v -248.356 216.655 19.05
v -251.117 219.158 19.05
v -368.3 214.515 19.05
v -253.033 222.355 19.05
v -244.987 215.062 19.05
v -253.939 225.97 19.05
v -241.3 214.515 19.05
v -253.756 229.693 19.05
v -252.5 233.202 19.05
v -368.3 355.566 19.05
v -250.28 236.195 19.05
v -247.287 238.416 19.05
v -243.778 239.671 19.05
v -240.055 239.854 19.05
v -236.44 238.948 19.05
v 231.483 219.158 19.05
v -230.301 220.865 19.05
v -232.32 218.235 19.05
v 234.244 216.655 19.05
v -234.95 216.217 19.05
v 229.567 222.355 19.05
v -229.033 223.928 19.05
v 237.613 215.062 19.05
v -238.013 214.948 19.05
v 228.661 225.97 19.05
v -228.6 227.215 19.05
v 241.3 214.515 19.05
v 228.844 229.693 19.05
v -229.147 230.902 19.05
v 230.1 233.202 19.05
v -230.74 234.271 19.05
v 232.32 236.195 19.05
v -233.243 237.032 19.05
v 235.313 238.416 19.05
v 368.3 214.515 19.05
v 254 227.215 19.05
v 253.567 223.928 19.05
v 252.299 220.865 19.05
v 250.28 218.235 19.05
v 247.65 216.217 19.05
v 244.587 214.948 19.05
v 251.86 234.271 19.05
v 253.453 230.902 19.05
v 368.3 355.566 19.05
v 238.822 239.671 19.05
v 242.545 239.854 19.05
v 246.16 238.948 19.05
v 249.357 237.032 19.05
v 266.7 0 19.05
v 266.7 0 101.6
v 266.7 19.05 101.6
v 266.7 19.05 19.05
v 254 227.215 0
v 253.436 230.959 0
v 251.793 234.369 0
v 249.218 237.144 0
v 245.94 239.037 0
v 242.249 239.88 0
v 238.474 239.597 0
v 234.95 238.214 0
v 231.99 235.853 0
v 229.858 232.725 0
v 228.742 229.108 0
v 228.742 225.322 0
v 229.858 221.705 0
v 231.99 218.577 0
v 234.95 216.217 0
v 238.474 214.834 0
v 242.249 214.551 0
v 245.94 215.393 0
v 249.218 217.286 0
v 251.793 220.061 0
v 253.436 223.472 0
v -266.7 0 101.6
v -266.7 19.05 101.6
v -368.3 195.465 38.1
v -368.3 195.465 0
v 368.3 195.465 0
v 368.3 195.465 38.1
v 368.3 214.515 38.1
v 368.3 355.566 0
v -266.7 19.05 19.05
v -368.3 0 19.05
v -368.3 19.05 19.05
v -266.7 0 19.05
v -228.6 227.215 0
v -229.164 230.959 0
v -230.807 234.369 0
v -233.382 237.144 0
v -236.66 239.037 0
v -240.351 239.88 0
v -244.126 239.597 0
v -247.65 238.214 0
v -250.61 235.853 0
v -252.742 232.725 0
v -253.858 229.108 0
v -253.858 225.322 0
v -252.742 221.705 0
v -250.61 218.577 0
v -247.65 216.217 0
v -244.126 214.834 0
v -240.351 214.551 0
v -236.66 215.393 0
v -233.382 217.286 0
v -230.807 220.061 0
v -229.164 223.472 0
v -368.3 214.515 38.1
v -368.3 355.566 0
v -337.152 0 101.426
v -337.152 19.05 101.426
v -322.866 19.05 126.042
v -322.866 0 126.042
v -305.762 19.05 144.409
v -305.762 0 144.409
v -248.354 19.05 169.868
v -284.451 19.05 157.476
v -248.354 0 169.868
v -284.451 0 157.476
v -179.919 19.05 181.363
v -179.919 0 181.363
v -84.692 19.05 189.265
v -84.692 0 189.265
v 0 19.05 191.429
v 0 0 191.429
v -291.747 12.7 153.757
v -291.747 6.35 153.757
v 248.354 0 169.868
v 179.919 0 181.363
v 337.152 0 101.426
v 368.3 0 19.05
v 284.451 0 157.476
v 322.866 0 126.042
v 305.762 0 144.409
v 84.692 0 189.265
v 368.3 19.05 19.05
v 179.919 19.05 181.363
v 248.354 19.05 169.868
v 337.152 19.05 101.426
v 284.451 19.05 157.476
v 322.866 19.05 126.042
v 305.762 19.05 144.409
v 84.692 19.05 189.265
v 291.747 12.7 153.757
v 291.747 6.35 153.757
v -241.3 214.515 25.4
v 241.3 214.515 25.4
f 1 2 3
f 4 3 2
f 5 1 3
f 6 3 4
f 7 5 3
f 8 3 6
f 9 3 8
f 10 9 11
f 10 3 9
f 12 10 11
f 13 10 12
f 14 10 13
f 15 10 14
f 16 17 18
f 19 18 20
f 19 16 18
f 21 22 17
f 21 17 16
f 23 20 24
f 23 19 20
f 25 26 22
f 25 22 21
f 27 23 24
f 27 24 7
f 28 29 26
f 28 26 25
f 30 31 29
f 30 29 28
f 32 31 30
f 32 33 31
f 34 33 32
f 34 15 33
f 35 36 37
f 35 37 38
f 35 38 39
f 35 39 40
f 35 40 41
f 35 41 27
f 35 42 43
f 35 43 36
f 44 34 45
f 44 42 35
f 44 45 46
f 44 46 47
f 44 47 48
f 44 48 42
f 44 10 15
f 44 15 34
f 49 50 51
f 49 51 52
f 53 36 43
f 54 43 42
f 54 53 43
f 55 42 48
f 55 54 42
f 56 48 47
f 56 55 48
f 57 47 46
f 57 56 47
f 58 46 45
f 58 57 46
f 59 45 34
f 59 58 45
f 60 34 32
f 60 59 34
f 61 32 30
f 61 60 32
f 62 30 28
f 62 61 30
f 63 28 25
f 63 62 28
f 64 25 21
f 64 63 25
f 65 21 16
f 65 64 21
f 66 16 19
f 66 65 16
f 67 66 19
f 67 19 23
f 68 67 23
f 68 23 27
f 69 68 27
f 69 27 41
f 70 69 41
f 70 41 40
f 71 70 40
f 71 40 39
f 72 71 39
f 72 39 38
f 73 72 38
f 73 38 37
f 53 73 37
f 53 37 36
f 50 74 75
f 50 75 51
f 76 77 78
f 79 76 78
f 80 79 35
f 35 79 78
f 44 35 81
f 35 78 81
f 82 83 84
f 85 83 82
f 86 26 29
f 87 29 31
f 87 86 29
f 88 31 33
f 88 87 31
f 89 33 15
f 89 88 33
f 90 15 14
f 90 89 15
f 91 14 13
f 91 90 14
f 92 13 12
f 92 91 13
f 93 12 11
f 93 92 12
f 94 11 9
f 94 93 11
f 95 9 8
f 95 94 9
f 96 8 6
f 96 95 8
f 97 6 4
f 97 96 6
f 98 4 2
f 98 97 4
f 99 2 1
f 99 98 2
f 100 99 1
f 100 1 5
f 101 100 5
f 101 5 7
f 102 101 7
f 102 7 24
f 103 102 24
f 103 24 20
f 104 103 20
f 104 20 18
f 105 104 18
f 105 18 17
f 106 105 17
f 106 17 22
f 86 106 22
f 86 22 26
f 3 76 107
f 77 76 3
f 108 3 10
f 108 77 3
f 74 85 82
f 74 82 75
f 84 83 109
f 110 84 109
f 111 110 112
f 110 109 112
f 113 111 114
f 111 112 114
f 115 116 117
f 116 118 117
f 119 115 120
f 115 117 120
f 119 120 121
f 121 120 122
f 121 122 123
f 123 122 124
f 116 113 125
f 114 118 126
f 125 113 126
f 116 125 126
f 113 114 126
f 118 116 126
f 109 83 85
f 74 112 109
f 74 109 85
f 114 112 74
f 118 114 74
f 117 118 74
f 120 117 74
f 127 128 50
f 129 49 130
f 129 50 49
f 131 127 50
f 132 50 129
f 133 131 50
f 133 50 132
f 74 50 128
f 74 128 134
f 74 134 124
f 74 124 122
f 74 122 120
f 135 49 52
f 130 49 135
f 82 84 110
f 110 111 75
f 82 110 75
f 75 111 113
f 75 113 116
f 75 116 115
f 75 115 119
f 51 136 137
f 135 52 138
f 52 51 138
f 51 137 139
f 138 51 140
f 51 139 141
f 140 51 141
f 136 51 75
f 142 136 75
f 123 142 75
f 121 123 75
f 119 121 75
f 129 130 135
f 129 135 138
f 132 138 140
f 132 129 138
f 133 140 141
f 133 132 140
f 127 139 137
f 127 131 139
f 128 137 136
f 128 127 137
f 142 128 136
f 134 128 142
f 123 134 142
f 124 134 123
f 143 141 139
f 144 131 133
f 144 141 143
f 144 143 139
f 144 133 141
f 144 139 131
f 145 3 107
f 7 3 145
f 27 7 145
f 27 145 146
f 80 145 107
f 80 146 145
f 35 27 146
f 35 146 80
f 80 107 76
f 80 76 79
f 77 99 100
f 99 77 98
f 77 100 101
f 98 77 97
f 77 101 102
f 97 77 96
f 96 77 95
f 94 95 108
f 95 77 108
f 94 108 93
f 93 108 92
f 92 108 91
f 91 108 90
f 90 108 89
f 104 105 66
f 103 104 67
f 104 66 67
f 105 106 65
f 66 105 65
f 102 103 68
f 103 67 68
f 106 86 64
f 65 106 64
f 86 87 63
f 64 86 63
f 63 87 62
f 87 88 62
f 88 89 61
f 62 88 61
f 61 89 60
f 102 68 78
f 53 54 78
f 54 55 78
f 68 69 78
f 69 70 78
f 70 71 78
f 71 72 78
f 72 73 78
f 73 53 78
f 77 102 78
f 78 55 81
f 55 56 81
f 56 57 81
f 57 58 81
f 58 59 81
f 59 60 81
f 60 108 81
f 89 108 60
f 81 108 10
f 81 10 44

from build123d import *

# Parameters (mm, degrees)
F0_W     = 736.6
F0_H     = 141.0510414562
F1_DEPTH = 19.05
F2_W     = 736.6
F2_H     = 19.05
F3_DEPTH = 38.1
F4_R     = 12.7
F5_DEPTH = 25.4
F7_DEPTH = 19.05


with BuildPart() as f1:
    # F0 (on Top) → F1 (new body)
    with BuildSketch(Plane.XY):
        with Locations((0, 285.0406648131)):
            Rectangle(F0_W, F0_H)
    extrude(amount=F1_DEPTH)

    # F2 (on Top) → F3 (join)
    with BuildSketch(Plane.XY):
        with Locations((0, 204.9901440851)):
            Rectangle(F2_W, F2_H)
    extrude(amount=F3_DEPTH)

    # F4 (on Top) → F5 (cut)
    with BuildSketch(Plane.XY):
        with Locations((241.3, 227.2151440851)):
            Circle(F4_R)
        with Locations((-241.3, 227.2151440851)):
            Circle(F4_R)
    extrude(amount=F5_DEPTH, mode=Mode.SUBTRACT)


with BuildPart() as f7:
    # F6 (on Front) → F7 (new body)
    with BuildSketch(Plane.XZ):
        with BuildLine():
            Line((266.7, 19.05), (368.3, 19.05))
            add(Edge.make_bspline(
                [(368.3, 19.05), (339.1115538209, 107.947042629), (309.9413467859, 161.162243232), (172.7409144831, 185.5559864442), (44.1386524315, 192.1503037592), (0, 191.4294660091)],
                knots=[0, 0, 0, 0, 0.3395171917, 0.6414180752, 1, 1, 1, 1], degree=3))
            add(Edge.make_bspline(
                [(-368.3, 19.05), (-339.1115538209, 107.947042629), (-309.9413467859, 161.162243232), (-172.7409144831, 185.5559864442), (-44.1386524315, 192.1503037592), (0, 191.4294660091)],
                knots=[0, 0, 0, 0, 0.3395171917, 0.6414180752, 1, 1, 1, 1], degree=3))
            Line((-368.3, 19.05), (-266.7, 19.05))
            Line((-266.7, 19.05), (-266.7, 101.6))
            Line((-266.7, 101.6), (0, 101.6))
            Line((0, 101.6), (266.7, 101.6))
            Line((266.7, 101.6), (266.7, 19.05))
        make_face()
    extrude(amount=-F7_DEPTH)


solid = Compound([f1.part, f7.part])
